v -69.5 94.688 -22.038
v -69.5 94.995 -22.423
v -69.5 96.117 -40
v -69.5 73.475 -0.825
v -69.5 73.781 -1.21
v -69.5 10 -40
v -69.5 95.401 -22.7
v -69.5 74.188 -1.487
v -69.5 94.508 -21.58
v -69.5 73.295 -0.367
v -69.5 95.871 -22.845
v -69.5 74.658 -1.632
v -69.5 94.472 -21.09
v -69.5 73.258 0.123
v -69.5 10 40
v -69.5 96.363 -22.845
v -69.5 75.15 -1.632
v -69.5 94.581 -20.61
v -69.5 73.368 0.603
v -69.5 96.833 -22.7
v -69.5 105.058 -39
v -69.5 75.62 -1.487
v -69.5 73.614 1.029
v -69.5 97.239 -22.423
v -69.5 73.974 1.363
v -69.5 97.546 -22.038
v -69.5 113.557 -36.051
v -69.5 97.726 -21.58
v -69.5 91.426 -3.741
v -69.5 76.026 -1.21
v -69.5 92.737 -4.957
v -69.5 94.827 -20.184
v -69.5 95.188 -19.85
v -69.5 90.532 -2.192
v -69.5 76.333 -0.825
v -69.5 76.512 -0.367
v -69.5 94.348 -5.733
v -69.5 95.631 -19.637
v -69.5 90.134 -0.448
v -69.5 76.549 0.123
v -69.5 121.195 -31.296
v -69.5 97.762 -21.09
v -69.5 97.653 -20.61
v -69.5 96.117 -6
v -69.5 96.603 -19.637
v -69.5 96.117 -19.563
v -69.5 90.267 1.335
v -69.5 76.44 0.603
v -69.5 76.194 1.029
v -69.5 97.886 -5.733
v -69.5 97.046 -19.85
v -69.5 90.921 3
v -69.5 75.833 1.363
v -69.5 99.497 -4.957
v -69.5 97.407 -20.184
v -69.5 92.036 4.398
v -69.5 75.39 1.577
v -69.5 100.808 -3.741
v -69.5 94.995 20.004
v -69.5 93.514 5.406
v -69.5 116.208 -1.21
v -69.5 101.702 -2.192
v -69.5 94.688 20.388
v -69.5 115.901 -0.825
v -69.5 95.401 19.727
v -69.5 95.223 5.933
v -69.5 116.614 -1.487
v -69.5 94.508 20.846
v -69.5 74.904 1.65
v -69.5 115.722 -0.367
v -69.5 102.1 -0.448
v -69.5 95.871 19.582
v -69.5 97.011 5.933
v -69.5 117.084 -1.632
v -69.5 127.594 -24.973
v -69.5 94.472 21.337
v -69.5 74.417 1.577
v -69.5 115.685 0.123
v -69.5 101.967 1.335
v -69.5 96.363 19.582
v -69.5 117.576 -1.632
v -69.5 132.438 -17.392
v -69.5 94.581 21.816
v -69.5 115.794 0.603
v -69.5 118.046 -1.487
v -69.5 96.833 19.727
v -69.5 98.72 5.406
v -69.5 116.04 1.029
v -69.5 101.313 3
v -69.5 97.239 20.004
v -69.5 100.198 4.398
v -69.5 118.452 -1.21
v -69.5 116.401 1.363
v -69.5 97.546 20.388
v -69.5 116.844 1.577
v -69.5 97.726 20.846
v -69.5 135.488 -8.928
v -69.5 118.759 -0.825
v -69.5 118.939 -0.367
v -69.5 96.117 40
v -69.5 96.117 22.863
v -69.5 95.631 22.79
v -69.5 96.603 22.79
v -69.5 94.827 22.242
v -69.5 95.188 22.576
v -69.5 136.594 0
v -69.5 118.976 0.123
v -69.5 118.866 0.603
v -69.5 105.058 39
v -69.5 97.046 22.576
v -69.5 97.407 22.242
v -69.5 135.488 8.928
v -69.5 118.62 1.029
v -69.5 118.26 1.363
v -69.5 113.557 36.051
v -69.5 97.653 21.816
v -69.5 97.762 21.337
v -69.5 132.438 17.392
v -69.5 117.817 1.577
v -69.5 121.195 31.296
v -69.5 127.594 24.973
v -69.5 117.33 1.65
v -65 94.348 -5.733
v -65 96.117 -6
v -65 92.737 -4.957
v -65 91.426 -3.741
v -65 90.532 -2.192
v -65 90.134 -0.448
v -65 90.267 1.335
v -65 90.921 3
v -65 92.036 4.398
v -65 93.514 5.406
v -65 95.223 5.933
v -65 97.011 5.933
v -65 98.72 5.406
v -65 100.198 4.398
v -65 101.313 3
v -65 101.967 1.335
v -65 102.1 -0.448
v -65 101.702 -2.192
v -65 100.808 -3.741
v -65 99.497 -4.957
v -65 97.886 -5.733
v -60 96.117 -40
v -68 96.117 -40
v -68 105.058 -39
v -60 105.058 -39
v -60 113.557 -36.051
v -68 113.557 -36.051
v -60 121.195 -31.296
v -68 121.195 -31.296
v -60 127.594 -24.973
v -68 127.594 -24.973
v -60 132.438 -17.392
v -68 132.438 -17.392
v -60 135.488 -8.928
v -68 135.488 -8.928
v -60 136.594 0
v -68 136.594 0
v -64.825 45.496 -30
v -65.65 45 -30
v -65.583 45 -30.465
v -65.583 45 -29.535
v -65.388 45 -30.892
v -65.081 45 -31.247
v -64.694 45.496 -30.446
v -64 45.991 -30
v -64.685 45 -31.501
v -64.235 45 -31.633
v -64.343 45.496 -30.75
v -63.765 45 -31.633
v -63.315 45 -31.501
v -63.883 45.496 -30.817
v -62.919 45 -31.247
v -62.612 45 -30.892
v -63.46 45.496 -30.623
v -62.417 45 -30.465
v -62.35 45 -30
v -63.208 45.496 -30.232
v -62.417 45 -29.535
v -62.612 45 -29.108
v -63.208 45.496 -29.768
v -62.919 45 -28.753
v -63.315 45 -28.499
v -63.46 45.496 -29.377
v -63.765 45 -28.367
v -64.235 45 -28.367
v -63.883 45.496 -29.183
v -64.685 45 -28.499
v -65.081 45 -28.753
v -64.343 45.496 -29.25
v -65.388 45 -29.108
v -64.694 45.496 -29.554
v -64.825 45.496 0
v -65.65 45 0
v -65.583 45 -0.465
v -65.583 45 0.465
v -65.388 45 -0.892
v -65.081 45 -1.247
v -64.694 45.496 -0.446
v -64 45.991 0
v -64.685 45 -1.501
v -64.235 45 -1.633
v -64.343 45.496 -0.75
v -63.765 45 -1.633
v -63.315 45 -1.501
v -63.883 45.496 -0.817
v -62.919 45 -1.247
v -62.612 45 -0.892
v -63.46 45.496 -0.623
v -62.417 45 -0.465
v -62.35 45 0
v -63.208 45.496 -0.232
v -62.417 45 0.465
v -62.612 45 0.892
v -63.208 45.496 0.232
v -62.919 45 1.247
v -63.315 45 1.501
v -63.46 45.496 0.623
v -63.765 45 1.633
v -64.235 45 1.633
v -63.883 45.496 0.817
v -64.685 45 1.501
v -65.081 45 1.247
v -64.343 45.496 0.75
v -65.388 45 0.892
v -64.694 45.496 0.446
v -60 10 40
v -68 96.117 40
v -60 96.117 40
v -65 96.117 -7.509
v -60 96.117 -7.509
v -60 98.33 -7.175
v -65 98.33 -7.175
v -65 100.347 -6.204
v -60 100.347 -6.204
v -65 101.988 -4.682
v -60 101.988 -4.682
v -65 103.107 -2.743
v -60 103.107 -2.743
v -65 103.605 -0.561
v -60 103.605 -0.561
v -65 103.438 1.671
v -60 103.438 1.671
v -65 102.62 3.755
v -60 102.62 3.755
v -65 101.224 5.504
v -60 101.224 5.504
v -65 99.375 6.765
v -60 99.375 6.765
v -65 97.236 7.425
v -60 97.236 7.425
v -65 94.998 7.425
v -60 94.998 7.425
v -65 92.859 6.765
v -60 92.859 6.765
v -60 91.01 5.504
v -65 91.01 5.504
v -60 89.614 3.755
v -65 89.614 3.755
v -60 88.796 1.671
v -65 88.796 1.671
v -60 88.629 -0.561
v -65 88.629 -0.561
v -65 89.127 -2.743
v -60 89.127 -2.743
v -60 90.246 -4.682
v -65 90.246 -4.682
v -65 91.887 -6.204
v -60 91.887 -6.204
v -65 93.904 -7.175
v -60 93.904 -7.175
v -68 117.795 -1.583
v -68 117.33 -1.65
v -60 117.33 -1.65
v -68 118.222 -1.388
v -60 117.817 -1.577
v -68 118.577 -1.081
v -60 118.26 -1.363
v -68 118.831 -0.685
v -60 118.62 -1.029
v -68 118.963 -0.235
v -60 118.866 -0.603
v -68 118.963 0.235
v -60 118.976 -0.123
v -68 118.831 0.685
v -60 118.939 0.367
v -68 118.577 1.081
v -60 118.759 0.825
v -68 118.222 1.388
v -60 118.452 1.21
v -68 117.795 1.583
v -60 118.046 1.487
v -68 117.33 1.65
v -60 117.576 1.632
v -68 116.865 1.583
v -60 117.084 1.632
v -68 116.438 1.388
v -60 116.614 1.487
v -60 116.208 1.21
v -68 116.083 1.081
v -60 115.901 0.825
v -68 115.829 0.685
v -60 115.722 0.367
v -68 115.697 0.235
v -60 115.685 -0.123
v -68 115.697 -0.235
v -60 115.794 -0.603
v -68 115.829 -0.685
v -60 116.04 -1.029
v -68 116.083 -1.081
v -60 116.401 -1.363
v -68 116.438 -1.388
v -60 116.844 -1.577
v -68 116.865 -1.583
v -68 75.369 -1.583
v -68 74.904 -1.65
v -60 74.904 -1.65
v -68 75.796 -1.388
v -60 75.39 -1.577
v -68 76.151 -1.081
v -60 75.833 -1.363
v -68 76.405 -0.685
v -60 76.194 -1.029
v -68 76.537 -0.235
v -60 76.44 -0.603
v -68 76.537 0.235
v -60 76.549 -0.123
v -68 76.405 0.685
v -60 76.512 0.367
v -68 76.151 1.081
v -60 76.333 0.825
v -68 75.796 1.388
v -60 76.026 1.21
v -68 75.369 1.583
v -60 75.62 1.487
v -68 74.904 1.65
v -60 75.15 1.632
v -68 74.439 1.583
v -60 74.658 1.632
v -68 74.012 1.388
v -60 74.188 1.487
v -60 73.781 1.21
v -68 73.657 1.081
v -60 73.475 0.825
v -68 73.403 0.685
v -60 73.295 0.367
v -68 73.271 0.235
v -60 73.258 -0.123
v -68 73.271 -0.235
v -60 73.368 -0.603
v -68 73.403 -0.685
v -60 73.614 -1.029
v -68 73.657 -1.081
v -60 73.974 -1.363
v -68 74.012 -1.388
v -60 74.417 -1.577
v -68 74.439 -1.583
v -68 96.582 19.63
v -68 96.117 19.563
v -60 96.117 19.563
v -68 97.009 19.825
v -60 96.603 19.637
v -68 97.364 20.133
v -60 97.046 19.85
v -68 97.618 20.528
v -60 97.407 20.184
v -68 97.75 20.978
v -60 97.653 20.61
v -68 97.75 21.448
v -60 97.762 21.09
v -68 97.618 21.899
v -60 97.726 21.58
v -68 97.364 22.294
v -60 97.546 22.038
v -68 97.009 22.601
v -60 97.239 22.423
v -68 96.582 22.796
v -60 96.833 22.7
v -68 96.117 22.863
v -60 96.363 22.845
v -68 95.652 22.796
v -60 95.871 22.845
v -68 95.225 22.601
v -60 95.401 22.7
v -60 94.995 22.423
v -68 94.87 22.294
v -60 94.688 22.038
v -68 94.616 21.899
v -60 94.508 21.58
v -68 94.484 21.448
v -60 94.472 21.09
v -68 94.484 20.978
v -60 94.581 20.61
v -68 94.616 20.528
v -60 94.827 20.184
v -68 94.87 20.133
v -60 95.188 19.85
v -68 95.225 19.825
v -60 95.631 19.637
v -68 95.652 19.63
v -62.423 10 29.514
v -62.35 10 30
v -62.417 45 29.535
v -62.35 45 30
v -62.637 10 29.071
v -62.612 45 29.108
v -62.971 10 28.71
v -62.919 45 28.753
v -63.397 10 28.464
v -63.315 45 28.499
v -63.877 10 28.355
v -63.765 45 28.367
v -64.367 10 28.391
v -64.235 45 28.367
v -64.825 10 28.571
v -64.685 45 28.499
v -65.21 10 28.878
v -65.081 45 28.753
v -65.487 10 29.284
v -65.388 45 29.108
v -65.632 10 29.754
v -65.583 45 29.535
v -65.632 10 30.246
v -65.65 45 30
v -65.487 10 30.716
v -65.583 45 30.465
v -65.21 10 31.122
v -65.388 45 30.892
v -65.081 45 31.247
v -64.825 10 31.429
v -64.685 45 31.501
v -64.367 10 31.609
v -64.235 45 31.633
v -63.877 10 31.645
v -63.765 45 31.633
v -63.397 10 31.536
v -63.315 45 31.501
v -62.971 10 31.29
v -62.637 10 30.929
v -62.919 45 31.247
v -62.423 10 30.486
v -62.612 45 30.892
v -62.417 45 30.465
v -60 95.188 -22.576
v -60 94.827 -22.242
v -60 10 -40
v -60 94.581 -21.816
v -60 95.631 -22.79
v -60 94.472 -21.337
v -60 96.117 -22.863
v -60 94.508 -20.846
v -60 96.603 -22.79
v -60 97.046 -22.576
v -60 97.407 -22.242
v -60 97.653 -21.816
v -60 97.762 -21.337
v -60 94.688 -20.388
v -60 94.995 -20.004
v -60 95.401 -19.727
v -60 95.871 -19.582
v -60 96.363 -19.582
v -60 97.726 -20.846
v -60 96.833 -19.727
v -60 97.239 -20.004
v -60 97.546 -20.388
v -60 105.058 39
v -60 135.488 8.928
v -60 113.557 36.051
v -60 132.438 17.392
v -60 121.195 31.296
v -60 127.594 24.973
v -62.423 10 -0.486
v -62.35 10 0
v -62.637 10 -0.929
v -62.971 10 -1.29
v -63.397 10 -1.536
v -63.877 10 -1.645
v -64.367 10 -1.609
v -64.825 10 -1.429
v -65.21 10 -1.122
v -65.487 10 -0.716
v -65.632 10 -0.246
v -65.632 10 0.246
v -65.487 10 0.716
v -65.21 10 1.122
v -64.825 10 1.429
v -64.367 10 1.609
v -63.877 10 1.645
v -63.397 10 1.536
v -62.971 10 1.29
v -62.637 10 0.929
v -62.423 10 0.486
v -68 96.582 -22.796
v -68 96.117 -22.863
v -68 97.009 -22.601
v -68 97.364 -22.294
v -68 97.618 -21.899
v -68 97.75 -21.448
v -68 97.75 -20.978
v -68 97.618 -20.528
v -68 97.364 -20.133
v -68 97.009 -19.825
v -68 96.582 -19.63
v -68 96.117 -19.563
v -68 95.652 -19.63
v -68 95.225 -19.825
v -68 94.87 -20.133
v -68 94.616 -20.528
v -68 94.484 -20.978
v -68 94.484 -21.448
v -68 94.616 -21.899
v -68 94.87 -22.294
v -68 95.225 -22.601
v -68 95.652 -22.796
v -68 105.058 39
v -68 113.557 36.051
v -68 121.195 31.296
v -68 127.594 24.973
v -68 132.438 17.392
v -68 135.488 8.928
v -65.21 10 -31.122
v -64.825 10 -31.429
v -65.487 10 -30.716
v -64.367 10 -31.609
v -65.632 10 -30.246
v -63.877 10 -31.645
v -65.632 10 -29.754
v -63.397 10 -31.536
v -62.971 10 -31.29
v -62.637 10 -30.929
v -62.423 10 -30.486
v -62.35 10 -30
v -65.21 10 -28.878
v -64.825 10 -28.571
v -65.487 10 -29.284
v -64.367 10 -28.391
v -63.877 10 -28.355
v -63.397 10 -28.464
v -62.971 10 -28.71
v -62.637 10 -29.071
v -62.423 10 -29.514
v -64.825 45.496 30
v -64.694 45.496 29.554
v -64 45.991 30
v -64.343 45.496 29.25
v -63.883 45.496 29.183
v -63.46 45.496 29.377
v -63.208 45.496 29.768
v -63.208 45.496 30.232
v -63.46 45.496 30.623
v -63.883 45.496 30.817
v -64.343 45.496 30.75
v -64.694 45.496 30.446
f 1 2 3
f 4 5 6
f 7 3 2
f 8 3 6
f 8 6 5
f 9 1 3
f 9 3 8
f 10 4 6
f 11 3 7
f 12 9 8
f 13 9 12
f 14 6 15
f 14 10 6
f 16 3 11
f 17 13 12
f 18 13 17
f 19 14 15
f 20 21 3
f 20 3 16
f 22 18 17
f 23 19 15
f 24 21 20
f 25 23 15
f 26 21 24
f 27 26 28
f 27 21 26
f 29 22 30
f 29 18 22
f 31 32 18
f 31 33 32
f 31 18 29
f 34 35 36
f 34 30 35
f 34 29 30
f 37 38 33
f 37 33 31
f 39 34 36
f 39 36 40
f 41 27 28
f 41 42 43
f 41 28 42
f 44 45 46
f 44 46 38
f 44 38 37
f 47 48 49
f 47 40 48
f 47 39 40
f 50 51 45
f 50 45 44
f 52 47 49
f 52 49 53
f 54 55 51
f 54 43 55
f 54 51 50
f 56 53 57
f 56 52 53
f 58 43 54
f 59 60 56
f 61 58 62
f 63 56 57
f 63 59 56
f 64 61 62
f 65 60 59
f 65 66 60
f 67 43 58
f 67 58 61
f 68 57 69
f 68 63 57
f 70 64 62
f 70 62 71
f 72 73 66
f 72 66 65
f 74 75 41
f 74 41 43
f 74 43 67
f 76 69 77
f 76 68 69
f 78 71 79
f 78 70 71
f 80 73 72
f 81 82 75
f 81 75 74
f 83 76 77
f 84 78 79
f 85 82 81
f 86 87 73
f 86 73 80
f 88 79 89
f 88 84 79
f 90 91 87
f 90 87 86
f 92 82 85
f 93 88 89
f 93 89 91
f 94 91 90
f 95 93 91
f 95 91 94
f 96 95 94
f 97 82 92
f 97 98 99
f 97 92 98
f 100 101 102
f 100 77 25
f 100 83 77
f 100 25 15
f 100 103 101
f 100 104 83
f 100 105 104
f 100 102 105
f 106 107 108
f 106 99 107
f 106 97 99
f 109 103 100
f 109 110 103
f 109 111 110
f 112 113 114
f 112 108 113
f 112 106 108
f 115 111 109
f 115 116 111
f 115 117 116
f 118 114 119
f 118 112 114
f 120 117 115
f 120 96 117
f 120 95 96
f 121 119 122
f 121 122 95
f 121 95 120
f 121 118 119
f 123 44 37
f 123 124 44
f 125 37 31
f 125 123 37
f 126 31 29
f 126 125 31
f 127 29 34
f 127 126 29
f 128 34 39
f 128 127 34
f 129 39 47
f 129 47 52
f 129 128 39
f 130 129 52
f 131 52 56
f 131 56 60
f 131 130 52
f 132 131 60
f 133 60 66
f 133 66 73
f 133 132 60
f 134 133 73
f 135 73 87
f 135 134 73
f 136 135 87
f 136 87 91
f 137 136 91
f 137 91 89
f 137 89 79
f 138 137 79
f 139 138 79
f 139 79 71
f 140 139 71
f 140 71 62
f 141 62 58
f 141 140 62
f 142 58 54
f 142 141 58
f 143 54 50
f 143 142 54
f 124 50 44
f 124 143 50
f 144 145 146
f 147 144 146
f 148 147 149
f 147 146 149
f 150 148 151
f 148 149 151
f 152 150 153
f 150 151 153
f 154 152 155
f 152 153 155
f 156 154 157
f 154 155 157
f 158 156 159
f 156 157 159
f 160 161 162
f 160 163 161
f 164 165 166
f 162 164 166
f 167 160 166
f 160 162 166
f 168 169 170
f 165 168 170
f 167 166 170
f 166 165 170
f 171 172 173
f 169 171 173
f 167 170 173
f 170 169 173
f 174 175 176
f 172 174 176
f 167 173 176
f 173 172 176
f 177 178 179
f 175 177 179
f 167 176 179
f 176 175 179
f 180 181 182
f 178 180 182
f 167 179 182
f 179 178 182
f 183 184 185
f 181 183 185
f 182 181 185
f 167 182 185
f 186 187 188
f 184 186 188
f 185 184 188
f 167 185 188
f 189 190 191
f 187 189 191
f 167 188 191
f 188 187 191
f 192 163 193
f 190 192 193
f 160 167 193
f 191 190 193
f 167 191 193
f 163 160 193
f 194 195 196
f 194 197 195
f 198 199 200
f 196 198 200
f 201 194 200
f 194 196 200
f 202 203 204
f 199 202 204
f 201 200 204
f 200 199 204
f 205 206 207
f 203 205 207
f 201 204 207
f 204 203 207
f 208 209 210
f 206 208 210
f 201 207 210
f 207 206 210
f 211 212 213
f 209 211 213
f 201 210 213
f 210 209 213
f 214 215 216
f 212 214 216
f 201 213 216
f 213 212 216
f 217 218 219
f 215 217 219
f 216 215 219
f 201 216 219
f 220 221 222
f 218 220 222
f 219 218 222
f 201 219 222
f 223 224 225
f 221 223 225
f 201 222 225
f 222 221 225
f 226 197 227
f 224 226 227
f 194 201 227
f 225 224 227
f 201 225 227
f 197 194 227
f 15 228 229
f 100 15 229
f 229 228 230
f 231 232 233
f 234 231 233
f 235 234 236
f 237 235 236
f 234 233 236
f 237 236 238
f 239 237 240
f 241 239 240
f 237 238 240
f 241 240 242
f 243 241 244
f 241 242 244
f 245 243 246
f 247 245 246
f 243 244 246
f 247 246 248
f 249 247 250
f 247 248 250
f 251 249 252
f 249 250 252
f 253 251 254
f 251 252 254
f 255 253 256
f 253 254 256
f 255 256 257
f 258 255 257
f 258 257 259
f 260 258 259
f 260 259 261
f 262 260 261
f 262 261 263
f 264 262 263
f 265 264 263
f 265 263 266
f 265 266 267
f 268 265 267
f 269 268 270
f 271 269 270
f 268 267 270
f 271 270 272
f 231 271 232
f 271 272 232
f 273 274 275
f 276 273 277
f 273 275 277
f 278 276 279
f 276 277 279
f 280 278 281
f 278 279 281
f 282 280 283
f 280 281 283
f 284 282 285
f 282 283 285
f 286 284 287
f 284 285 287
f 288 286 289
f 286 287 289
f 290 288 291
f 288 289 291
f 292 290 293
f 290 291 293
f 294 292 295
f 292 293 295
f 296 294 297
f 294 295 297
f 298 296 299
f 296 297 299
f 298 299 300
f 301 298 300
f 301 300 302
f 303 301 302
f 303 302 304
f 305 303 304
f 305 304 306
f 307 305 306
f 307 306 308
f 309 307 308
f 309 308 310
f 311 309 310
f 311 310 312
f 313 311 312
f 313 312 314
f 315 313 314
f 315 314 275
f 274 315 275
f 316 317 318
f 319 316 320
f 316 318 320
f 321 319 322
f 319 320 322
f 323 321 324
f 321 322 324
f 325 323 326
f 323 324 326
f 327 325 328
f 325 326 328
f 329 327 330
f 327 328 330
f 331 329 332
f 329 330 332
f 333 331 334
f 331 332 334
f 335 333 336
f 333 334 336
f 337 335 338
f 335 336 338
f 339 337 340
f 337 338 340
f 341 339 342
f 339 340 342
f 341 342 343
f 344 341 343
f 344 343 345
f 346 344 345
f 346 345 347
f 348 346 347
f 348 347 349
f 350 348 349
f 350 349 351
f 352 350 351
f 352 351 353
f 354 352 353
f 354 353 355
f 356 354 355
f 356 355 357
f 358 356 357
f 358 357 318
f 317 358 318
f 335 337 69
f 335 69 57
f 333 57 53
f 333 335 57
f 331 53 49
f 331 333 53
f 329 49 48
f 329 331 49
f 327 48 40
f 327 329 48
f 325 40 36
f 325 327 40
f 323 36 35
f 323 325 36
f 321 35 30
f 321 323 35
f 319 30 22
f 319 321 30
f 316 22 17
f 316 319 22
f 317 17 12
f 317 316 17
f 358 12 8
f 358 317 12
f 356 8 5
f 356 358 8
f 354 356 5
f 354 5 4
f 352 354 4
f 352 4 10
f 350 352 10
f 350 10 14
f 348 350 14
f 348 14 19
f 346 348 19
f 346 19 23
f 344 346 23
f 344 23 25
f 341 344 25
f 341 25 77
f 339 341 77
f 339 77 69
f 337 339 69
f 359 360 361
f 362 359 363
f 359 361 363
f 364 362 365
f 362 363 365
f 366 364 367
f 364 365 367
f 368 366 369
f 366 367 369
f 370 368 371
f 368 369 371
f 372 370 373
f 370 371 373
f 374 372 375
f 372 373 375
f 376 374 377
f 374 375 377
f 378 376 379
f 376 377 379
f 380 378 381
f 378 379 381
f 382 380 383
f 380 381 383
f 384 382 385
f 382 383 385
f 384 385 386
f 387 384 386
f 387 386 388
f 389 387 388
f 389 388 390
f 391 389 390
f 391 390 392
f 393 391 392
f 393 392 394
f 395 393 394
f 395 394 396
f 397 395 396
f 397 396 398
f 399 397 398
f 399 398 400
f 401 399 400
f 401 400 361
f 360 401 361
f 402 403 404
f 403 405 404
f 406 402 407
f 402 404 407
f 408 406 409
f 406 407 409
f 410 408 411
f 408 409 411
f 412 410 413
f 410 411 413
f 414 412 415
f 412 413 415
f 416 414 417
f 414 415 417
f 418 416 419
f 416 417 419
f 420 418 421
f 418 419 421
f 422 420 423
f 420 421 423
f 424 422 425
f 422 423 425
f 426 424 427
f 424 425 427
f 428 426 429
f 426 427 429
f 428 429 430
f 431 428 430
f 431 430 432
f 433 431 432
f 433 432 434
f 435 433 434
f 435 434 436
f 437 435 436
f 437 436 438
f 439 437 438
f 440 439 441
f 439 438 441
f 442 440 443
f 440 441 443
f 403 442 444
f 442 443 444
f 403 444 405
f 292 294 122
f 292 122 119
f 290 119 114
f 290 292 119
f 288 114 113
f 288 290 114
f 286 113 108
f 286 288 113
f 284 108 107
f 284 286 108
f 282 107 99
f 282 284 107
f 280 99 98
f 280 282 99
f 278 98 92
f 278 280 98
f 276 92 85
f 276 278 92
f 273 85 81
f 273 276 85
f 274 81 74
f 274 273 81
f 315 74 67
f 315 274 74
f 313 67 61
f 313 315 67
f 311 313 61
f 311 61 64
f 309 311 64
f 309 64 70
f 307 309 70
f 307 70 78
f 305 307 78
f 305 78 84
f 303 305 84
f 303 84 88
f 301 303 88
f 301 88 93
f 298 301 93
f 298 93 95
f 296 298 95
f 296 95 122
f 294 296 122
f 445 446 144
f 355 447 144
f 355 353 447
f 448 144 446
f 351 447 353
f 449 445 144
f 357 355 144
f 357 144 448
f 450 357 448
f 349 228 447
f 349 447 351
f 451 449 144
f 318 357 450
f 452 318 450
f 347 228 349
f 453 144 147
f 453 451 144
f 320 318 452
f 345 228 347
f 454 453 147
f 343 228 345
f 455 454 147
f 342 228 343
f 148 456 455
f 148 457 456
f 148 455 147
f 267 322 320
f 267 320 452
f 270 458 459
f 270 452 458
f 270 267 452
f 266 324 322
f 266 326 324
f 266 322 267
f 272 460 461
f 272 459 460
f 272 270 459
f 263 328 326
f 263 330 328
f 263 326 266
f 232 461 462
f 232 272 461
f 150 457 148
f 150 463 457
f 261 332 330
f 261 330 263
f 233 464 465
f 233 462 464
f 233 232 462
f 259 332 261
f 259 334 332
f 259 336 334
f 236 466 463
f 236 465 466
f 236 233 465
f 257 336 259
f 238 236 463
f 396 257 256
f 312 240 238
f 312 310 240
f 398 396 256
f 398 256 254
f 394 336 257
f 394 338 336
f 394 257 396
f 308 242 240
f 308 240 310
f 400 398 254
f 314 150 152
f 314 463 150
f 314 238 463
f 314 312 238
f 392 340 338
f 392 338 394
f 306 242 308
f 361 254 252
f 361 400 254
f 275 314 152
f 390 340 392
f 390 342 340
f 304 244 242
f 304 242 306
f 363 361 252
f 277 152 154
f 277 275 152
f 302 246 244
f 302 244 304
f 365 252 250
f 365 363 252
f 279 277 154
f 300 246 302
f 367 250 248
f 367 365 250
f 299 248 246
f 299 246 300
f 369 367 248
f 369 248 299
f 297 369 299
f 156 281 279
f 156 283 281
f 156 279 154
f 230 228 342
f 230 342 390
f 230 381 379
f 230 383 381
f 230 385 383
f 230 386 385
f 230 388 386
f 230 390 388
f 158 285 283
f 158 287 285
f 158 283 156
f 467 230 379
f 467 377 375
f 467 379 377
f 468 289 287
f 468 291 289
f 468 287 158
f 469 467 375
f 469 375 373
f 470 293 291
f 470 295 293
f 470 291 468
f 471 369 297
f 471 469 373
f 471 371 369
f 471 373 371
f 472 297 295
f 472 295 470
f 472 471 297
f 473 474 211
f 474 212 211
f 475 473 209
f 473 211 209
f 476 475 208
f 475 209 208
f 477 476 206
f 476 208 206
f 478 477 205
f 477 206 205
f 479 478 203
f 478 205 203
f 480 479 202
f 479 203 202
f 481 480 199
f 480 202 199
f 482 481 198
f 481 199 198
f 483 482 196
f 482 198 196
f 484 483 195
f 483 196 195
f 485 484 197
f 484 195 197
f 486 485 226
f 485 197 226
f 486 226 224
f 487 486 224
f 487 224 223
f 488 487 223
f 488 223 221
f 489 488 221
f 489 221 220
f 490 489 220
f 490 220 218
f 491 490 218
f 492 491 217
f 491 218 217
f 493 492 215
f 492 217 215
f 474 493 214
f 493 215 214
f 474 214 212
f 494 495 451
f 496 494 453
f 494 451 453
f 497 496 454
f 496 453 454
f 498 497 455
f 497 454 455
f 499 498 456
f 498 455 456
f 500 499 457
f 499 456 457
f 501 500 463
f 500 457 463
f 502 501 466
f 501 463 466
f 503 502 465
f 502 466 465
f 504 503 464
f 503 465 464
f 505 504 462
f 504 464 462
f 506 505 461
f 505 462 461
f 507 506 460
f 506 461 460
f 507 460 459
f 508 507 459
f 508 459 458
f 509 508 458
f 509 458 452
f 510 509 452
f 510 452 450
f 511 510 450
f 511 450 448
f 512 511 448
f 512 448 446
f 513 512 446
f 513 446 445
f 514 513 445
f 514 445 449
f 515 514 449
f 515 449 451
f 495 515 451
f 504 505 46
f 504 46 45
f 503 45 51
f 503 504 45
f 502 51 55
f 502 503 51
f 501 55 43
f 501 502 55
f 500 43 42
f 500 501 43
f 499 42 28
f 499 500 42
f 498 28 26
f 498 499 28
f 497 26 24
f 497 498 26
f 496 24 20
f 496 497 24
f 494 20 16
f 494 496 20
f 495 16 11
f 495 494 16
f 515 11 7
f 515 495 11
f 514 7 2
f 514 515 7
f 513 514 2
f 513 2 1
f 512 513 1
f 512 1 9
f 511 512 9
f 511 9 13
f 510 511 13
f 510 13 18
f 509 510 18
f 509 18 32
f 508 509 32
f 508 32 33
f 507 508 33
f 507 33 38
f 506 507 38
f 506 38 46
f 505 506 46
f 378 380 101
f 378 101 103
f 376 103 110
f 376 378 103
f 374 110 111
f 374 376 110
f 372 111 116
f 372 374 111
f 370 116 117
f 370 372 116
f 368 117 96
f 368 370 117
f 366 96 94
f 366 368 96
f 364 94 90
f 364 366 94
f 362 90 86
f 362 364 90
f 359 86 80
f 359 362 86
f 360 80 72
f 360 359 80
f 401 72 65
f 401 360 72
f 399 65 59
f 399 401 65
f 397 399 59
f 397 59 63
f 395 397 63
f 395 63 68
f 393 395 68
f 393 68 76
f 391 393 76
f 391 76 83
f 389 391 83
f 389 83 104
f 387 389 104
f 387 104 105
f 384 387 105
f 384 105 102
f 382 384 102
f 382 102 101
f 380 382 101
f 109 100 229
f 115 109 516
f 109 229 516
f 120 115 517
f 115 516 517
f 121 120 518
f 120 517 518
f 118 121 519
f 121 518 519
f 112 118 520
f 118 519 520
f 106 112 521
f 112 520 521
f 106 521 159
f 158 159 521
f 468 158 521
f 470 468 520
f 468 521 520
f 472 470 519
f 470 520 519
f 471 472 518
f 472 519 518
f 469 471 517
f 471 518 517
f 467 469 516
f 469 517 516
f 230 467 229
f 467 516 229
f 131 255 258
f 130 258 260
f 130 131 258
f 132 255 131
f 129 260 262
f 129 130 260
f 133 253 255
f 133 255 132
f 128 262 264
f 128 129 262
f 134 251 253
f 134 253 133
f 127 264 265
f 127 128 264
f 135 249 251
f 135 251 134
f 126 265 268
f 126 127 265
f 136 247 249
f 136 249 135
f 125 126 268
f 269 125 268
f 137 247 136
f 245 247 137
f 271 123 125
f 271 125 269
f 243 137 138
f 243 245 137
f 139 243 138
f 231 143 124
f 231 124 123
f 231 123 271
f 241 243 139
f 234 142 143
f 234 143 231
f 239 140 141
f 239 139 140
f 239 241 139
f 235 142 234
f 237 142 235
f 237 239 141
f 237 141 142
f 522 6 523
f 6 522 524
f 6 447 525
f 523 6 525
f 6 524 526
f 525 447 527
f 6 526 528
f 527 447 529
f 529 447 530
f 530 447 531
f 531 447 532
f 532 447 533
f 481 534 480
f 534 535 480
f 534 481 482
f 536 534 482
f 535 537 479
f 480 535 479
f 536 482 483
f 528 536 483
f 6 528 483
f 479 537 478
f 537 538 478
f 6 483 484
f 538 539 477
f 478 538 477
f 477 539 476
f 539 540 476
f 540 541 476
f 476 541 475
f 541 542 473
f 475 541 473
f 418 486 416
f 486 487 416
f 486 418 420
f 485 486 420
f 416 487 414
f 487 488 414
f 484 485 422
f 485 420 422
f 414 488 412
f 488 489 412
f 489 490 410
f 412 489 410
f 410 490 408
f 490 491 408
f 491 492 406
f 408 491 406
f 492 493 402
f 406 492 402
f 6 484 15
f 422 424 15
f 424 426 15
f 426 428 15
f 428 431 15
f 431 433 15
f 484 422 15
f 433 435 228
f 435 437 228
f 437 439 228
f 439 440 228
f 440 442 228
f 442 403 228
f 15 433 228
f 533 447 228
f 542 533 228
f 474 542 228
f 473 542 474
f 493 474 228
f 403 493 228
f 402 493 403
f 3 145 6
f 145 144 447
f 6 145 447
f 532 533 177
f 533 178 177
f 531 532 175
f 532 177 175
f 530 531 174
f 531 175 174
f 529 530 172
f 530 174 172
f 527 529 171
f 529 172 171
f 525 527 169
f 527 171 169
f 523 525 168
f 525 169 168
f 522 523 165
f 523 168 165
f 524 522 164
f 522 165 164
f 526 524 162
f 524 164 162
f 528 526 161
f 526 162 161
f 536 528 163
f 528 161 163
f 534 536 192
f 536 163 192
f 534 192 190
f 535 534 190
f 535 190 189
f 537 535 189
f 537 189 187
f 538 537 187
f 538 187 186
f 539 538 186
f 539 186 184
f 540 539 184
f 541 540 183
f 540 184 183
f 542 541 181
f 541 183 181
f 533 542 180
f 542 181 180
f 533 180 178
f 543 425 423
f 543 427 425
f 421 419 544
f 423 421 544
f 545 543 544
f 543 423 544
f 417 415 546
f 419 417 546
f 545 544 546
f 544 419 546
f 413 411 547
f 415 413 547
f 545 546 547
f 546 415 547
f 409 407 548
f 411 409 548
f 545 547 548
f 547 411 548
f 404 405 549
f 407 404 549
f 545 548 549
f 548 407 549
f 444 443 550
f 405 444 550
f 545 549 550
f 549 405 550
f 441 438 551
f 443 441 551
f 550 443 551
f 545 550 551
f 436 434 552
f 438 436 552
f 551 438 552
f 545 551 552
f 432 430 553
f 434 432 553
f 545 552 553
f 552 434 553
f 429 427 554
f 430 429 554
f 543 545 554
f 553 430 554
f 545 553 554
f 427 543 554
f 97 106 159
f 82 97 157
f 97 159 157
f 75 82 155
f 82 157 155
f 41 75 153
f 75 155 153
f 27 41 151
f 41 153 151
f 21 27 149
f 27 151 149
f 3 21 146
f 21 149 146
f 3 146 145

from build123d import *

# Parameters (mm, degrees)
STOCK_NEW_TRACKER_1_START = -68
STOCK_NEW_TRACKER_1_DEPTH = 8
SKETCH1_R                 = 7.5089999999999995
CUT_EXTRUDE1_DEPTH        = 5
SKETCH2_R                 = 6.000000000000002
CUT_EXTRUDE2_DEPTH        = 143.41825129942816
M4X0_7_TAPPED_HOLE1_D     = 3.3
M4X0_7_TAPPED_HOLE1_DEPTH = 35
M4X0_7_TAPPED_HOLE1_TIP   = 0.9914200213954745
M4X0_7_TAPPED_HOLE2_D     = 3.3
SKETCH10_R                = 1.6499999999999984
SKETCH10_R_2              = 1.6499999999999986
SKETCH10_R_3              = 6.000000000000005
BOSS_EXTRUDE1_DEPTH       = 1.5


# Read off the part's stored shape, not the designer's step: Stock-New_Tracker-1
with BuildPart() as part:
    # Stock-New_Tracker-1 outline → Stock-New_Tracker-1 (new body)
    with BuildSketch(Plane.YZ.offset(STOCK_NEW_TRACKER_1_START)):
        with BuildLine():
            Line((10, 40.00000001), (10, -40.00000001))
            Line((10, -40.00000001), (96.116983094, -40.00000001))
            ThreePointArc((96.116983094, -40.00000001), (124.570453888, -28.312888017), (136.594137145, 0))
            ThreePointArc((136.594137145, 0), (124.570453888, 28.312888017), (96.116983094, 40.00000001))
            Line((96.116983094, 40.00000001), (10, 40.00000001))
        make_face()
    extrude(amount=STOCK_NEW_TRACKER_1_DEPTH)

    # Sketch1 → Cut-Extrude1 (cut)
    with BuildSketch(Plane(origin=(-60, 0, 1.041e-14), x_dir=(-1.7e-16, 0, -1), z_dir=(1, 0, -1.7e-16))):
        with Locations((0, 96.11698309434121)):
            Circle(SKETCH1_R)
    extrude(amount=-CUT_EXTRUDE1_DEPTH, mode=Mode.SUBTRACT)

    # Sketch2 → Cut-Extrude2 (cut, through all)
    with BuildSketch(Plane(origin=(-65, 0, 1.128e-14), x_dir=(-1.7e-16, 0, -1), z_dir=(1, 0, -1.7e-16))):
        with Locations((0, 96.11698309434121)):
            Circle(SKETCH2_R)
    extrude(amount=-CUT_EXTRUDE2_DEPTH, mode=Mode.SUBTRACT)

    # M4x0.7 Tapped Hole1
    with Locations(Plane(origin=(0, 10, 0), x_dir=(-1, 0, 0), z_dir=(0, -1, 0))):
        with Locations((64, -30), (64, 0), (64, 30)):
            Hole(M4X0_7_TAPPED_HOLE1_D / 2, depth=M4X0_7_TAPPED_HOLE1_DEPTH)
            with Locations((0, 0, -(M4X0_7_TAPPED_HOLE1_DEPTH + M4X0_7_TAPPED_HOLE1_TIP / 2))):  # 118° drill point
                Cone(0, M4X0_7_TAPPED_HOLE1_D / 2, M4X0_7_TAPPED_HOLE1_TIP, mode=Mode.SUBTRACT)

    # M4x0.7 Tapped Hole2 (through all)
    with Locations(Plane.ZY.offset(67.99999999999999)):
        with Locations((0, 74.903779659), (-21.213203436, 96.116983094), (0, 117.33018653), (21.213203436, 96.116983094)):
            Hole(M4X0_7_TAPPED_HOLE2_D / 2)

    # Sketch10 → Boss-Extrude1 (add)
    with BuildSketch(Plane.ZY.offset(67.99999999999999)):
        with BuildLine():
            Line((40.00000000999996, 10), (40.00000000999996, 96.11698309434121))
            ThreePointArc((40.00000000999996, 96.11698309434121), (28.312888017242308, 124.57045388794387), (-3.291e-14, 136.59413714461505))
            ThreePointArc((-3.291e-14, 136.59413714461505), (-28.31288801724237, 124.57045388794387), (-40.00000001000003, 96.11698309434121))
            Line((-40.00000001000003, 96.11698309434121), (-40.00000001000003, 10))
            Line((-40.00000001000003, 10), (40.00000000999996, 10))
        make_face()
        with Locations((1.335e-14, 117.33018652993762)):
            Circle(SKETCH10_R, mode=Mode.SUBTRACT)
        with Locations((21.213203435596416, 96.11698309434121)):
            Circle(SKETCH10_R_2, mode=Mode.SUBTRACT)
        with Locations(Location((0, 96.11698309434121, 0), (0, 0, 180))):
            Circle(SKETCH10_R_3, mode=Mode.SUBTRACT)
        with Locations((-21.213203435596416, 96.11698309434121)):
            Circle(SKETCH10_R_2, mode=Mode.SUBTRACT)
        with Locations((1.513e-14, 74.9037796587448)):
            Circle(SKETCH10_R, mode=Mode.SUBTRACT)
    extrude(amount=BOSS_EXTRUDE1_DEPTH)


solid = part.part
